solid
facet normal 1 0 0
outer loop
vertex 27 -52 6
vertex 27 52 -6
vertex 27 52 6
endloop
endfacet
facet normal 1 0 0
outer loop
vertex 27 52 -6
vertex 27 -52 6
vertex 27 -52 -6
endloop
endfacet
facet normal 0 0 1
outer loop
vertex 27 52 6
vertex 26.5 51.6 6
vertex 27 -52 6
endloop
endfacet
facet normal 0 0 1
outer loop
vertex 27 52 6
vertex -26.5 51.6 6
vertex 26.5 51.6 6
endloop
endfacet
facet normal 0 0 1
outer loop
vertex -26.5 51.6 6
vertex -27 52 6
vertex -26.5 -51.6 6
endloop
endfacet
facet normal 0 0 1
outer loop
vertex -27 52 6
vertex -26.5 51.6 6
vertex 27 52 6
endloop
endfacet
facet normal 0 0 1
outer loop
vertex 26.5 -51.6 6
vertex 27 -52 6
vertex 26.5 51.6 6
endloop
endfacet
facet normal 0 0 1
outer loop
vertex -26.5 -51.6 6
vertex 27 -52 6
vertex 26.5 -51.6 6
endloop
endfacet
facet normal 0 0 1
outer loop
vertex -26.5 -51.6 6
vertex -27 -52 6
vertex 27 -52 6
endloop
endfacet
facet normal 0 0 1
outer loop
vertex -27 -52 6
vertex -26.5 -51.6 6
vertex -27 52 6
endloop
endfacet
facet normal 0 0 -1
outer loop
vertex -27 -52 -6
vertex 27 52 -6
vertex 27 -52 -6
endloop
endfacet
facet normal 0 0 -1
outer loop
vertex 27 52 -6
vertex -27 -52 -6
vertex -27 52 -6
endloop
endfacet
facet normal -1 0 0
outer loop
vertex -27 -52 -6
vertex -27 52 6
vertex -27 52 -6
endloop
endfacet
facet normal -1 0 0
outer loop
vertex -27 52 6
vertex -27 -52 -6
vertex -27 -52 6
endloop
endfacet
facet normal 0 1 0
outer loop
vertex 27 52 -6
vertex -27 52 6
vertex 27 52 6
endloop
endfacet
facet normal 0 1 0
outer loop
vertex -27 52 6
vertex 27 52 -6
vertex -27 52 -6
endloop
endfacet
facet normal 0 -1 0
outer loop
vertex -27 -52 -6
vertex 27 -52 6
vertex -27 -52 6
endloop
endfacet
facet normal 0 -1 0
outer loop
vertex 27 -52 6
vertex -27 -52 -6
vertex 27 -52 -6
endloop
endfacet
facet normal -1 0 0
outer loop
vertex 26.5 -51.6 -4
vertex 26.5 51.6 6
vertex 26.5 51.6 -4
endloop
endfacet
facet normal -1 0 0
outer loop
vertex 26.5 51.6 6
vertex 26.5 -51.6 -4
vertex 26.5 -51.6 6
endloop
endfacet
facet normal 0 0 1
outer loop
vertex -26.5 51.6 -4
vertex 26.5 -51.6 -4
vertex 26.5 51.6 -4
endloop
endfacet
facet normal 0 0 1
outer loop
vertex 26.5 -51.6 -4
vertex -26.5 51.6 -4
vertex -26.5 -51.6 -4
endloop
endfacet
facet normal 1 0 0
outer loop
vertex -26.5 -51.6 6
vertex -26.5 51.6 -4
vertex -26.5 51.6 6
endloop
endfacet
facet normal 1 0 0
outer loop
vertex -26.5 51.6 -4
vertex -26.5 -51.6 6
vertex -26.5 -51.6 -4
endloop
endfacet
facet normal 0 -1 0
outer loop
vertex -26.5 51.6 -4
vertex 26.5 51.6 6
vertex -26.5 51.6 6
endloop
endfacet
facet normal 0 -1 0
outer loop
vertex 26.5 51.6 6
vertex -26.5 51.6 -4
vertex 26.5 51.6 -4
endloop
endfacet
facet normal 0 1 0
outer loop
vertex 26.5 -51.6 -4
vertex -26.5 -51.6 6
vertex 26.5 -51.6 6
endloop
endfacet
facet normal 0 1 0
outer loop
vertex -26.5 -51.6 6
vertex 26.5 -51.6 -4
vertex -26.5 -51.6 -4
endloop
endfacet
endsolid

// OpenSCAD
module bottom(){
    difference(){
        difference(){
            cube([54,104,43],center=true);

            translate([0,0,2])cube([51,101,41],center=true);
        }
        translate([0,0,16.5])difference(){
            cube([54,104,10],center=true);
            cube([52.5,103,10],center=true);
        }
    }
}

module top(){
    difference(){
        cube([54,104,12],center=true);
        translate([0,0,1])cube([53,103.2,10],center=true);
    }
}

top();
//bottom();
